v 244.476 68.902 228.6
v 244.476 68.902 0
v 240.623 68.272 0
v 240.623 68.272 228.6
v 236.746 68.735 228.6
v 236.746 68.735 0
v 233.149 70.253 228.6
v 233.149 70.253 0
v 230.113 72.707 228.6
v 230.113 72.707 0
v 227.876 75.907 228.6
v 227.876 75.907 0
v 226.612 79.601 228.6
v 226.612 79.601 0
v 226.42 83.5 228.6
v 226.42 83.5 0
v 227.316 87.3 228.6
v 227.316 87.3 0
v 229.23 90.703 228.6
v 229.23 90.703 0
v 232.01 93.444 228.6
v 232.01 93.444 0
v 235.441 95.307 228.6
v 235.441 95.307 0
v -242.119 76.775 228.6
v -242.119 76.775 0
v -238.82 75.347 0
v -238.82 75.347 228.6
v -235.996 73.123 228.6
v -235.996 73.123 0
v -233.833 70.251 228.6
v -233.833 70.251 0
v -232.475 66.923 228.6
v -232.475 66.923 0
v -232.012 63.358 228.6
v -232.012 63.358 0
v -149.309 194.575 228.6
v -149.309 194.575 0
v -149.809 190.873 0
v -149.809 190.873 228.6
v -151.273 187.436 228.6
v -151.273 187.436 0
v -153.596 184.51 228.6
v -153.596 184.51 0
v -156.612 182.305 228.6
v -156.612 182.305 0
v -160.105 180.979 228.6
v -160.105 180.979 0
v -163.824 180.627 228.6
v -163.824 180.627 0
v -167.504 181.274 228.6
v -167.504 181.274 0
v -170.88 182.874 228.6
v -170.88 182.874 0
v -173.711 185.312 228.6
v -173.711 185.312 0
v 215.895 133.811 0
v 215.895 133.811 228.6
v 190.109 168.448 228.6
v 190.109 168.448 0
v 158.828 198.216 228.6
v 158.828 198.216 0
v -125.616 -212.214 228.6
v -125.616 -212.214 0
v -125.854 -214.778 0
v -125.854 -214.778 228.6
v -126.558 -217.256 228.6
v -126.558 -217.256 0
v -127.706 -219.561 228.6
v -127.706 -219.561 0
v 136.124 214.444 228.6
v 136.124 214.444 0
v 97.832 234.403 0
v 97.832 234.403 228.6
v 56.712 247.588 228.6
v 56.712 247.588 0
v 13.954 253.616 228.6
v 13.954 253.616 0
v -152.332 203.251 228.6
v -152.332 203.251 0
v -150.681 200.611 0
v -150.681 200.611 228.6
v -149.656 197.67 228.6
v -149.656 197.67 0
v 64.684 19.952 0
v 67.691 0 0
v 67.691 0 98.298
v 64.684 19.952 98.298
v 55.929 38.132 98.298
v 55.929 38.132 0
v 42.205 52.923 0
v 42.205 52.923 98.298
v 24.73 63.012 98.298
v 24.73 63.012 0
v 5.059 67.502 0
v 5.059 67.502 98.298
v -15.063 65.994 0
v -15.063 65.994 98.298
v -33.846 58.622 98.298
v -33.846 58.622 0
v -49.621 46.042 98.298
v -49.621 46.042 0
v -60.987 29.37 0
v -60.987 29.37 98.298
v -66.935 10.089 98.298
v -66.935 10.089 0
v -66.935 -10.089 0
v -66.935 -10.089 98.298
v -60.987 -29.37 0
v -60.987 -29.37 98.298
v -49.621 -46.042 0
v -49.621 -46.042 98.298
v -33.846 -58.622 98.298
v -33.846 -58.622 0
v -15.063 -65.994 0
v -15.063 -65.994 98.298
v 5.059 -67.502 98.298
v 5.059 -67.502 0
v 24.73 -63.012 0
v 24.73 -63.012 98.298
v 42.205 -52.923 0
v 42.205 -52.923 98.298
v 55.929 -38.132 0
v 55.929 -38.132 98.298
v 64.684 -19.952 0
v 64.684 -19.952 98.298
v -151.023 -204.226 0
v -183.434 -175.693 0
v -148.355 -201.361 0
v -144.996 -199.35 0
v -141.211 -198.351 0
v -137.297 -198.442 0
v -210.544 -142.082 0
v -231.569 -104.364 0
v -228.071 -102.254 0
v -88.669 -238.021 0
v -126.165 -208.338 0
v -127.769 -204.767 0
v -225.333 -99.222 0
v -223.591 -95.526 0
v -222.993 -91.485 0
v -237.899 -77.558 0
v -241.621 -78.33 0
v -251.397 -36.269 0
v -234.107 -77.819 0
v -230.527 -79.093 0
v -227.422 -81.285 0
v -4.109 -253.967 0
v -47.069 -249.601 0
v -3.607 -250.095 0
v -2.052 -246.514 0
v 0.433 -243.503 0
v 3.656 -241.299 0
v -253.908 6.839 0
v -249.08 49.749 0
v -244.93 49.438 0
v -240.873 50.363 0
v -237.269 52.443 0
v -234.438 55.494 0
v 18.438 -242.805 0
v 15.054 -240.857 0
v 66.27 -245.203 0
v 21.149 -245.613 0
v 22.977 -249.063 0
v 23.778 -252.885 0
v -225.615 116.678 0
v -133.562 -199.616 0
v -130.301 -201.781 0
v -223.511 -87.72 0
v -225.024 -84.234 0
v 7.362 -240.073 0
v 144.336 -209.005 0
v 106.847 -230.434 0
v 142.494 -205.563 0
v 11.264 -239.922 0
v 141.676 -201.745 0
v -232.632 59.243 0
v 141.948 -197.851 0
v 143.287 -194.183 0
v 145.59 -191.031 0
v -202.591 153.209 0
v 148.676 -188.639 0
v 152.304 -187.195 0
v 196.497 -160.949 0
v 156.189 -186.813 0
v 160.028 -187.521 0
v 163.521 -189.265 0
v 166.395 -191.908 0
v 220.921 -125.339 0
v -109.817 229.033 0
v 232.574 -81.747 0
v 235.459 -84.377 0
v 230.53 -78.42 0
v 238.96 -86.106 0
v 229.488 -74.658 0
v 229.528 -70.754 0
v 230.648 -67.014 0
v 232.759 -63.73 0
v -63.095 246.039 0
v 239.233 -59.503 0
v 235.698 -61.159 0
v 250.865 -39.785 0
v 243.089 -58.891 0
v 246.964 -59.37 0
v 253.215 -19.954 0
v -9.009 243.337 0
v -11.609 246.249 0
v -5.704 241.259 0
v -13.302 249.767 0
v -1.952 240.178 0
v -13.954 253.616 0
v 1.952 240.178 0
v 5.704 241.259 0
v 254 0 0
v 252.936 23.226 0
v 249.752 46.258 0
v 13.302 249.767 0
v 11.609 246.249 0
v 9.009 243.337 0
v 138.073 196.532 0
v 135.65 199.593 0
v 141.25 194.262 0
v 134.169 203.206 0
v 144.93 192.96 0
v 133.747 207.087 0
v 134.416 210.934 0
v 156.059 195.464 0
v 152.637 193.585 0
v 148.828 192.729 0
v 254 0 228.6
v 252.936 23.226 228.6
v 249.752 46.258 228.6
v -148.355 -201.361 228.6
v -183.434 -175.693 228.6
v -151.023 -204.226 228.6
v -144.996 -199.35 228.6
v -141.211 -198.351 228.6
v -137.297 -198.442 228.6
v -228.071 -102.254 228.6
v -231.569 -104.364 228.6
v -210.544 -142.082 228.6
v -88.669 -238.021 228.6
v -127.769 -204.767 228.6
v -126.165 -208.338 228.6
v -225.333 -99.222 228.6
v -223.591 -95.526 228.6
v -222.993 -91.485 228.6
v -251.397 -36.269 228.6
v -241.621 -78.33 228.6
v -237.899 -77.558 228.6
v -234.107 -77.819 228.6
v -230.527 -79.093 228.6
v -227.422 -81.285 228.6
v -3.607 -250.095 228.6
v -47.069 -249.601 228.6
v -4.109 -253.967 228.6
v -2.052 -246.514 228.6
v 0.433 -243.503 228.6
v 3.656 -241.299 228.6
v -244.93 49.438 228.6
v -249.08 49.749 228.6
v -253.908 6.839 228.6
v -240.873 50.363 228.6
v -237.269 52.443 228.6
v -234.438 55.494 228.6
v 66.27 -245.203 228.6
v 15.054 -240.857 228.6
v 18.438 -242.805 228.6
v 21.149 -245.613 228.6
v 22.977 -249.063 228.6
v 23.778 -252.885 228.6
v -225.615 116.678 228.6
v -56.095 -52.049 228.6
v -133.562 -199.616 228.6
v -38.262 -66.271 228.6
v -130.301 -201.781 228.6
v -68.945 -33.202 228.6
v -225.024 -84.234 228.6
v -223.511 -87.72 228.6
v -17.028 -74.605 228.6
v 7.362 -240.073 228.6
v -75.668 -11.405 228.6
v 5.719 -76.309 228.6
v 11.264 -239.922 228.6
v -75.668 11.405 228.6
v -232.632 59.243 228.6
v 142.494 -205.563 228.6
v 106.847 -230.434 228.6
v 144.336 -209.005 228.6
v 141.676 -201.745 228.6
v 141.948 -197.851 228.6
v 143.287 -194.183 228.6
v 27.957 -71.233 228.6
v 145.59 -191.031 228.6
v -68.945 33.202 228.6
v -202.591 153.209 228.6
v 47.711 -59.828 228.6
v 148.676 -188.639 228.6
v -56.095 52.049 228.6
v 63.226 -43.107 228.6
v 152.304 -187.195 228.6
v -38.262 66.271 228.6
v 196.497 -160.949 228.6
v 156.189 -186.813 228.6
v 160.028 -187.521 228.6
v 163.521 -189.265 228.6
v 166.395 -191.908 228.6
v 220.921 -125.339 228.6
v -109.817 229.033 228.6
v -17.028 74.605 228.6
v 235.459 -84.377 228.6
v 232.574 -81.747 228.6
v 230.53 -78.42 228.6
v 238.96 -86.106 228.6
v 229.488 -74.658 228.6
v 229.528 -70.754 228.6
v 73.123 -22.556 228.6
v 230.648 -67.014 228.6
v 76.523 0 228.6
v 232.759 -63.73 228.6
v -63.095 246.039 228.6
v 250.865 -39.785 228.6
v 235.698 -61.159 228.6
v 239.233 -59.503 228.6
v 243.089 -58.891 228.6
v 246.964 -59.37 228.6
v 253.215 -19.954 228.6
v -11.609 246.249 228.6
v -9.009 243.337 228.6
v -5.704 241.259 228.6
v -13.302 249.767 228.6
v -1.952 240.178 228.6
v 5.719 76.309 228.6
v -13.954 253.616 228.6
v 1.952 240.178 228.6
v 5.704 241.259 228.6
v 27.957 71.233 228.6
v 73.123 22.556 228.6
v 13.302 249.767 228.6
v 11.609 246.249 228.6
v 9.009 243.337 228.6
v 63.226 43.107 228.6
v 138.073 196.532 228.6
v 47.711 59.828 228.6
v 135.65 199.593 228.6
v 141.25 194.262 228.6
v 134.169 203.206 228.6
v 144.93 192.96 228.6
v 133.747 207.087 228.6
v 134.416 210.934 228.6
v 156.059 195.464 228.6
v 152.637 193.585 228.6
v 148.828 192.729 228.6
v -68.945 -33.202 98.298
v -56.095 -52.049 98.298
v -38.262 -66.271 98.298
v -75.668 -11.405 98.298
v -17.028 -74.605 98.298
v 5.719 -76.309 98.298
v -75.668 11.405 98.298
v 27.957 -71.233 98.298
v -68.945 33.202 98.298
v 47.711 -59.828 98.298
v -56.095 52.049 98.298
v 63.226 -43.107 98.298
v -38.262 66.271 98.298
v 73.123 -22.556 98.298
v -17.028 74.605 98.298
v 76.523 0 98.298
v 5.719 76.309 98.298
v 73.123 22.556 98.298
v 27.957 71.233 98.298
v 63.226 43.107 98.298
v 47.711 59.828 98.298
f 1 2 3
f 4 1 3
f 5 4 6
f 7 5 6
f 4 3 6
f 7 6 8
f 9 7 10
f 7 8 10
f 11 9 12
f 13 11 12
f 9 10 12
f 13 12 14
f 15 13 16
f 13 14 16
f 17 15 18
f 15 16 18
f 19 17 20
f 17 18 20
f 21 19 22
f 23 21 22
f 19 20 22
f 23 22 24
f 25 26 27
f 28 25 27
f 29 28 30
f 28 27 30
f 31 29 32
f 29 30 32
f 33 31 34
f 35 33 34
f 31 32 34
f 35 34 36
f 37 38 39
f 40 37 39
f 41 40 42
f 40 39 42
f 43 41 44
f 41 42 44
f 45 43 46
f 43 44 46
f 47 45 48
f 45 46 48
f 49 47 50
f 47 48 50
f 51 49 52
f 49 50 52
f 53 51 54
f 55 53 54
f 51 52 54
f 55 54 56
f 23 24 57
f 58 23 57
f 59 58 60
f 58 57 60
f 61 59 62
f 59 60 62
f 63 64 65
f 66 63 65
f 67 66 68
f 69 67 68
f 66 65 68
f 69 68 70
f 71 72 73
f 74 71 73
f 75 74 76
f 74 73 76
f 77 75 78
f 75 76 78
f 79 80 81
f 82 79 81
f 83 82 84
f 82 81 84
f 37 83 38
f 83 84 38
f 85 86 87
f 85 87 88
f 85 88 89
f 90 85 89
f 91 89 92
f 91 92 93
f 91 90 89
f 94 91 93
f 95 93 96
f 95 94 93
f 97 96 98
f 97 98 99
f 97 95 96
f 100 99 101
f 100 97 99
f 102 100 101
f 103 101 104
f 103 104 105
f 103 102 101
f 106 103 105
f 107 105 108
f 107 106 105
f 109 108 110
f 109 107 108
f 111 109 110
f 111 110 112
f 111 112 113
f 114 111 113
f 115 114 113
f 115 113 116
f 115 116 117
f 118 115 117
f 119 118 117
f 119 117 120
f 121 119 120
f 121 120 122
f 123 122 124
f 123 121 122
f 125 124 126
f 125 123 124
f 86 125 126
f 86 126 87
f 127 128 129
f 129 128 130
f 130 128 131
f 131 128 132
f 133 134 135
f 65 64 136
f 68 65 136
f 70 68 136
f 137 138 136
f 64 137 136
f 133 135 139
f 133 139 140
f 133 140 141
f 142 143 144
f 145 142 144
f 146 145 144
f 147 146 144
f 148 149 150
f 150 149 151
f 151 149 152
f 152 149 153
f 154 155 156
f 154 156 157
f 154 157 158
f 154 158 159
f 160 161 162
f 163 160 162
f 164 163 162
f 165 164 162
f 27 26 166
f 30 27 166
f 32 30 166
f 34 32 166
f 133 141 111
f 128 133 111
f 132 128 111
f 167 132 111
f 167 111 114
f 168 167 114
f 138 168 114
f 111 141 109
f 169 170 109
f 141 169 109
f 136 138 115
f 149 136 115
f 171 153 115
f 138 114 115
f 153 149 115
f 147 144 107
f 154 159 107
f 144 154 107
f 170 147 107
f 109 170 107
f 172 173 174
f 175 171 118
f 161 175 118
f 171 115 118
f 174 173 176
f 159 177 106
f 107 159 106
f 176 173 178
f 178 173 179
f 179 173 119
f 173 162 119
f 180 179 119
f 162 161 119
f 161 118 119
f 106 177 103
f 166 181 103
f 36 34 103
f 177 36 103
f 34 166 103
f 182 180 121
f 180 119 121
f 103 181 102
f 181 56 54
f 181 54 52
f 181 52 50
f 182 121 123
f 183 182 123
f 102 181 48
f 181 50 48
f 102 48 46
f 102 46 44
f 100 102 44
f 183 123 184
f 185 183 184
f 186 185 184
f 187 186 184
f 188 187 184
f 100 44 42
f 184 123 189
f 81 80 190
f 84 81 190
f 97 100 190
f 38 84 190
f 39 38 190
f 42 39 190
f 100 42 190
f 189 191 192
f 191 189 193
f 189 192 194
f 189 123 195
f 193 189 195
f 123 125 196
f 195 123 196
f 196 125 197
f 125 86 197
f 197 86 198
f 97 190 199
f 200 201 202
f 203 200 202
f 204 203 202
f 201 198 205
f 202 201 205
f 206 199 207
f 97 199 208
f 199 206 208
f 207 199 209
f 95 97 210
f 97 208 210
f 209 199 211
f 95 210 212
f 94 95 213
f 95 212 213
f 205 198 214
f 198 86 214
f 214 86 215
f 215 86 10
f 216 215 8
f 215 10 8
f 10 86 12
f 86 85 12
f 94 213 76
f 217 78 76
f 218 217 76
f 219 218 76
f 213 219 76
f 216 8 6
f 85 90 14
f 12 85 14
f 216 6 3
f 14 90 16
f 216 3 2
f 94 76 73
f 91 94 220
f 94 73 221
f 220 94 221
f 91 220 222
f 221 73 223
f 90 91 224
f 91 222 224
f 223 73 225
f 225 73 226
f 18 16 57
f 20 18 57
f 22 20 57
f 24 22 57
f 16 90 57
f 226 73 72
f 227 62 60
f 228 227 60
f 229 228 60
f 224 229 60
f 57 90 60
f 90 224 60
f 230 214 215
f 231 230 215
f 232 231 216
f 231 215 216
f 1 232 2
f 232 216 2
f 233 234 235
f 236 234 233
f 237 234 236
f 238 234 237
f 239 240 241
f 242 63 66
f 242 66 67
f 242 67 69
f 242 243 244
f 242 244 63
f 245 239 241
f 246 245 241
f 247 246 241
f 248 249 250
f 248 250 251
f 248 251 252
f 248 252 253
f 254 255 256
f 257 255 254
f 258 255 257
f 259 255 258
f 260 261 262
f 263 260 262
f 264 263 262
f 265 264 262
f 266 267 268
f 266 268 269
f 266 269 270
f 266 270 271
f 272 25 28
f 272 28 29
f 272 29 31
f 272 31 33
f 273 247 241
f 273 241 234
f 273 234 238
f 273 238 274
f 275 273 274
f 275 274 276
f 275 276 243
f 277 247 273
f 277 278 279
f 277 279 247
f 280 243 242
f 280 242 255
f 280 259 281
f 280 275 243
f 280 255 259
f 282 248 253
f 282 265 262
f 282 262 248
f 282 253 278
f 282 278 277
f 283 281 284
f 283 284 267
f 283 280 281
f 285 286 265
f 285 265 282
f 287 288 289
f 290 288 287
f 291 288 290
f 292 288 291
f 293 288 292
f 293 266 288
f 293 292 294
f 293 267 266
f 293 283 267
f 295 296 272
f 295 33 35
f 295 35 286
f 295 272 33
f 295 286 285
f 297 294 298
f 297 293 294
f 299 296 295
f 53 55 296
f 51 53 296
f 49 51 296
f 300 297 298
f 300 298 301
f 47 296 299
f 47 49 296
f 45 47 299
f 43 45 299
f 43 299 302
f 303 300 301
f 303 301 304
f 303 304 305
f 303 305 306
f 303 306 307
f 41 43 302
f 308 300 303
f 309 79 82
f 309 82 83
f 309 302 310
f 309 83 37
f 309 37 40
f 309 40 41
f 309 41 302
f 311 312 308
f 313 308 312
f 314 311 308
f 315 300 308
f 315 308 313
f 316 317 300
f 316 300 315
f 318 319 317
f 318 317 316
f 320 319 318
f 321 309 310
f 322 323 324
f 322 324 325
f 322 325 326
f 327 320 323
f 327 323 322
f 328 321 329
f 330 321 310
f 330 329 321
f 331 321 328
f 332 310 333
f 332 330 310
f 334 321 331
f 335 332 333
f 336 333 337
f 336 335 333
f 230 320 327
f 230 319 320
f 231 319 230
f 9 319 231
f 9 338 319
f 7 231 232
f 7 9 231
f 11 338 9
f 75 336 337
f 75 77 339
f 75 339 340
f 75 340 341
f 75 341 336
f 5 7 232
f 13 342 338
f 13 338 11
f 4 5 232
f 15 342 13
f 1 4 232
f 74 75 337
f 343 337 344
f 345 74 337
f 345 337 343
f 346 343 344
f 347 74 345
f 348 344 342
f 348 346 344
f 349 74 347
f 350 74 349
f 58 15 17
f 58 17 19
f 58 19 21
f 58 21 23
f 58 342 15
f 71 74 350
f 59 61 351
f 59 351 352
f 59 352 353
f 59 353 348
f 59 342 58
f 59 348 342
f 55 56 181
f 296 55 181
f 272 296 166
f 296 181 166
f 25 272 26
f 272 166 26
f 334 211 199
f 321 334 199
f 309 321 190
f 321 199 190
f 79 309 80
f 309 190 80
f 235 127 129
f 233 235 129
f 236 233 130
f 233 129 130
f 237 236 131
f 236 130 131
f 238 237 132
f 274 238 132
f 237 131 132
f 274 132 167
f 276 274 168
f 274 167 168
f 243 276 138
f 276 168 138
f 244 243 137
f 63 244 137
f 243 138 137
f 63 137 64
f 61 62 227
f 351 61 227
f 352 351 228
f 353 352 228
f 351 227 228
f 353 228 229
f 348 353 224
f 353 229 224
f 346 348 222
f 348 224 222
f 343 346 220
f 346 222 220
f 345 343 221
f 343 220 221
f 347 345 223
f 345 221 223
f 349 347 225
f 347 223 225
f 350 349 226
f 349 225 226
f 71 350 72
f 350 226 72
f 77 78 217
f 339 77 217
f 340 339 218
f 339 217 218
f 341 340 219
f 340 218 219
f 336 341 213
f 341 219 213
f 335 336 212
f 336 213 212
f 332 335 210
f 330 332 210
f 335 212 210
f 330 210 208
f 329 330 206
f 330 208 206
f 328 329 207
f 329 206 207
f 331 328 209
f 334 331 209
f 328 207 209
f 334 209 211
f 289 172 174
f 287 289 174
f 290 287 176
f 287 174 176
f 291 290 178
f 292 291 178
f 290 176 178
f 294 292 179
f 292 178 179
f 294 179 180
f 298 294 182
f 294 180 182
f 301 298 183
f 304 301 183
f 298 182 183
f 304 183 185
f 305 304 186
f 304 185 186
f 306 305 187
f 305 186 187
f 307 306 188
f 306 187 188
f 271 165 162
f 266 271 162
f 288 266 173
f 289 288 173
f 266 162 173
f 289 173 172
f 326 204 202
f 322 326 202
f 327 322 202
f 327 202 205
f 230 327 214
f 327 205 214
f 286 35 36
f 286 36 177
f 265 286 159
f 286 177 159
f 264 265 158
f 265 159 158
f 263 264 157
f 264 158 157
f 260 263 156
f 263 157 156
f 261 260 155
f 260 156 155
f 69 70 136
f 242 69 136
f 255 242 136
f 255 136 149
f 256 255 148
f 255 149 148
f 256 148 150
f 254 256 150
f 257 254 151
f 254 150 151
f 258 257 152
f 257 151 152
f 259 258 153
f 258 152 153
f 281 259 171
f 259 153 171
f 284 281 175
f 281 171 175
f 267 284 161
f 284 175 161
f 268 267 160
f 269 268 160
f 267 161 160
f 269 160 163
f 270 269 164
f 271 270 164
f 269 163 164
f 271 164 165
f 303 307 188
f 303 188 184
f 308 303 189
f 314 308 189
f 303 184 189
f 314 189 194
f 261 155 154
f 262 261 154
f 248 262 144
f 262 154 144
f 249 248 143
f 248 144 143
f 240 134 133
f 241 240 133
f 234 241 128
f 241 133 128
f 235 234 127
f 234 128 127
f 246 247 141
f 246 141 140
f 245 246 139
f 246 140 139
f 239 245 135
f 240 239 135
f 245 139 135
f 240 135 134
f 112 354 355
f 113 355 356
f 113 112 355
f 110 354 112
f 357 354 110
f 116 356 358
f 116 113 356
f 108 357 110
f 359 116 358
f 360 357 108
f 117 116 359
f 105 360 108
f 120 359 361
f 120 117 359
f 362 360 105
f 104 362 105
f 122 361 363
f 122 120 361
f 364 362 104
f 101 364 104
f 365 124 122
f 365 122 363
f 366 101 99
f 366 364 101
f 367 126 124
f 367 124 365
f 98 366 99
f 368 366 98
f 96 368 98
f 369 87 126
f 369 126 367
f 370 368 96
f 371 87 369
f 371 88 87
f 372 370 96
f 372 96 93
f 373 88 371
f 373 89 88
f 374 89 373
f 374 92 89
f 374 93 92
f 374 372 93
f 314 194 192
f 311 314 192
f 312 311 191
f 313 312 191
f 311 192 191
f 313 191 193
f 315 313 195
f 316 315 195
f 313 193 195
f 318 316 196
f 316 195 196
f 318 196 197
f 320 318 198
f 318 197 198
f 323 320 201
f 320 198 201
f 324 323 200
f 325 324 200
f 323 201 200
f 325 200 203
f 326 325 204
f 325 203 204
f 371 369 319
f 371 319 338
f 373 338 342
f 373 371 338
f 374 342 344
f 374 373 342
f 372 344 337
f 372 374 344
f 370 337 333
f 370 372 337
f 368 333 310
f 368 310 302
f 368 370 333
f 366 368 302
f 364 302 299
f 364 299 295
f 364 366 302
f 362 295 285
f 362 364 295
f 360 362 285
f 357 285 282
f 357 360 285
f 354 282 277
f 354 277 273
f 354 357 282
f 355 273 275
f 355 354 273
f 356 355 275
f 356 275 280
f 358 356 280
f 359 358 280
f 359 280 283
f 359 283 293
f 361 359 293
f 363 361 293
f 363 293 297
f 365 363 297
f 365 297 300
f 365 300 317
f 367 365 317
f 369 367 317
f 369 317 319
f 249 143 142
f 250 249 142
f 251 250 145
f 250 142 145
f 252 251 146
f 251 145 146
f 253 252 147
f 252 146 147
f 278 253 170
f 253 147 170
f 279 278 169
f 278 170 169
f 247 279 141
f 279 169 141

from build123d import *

# Parameters (mm, degrees)
F0_R     = 67.691
F1_DEPTH = 98.298
F2_R     = 76.523192
F3_DEPTH = 228.6


with BuildPart() as f1:
    # F0 (on Top) → F1 (new body)
    with BuildSketch(Plane.XY):
        Polygon((20.642572, -144.15397), (135.162286, -54.199993), (114.519714, 89.953977), (-20.642572, 144.15397), (-135.162286, 54.199993), (-114.519714, -89.953977), align=None)
        Circle(F0_R, mode=Mode.SUBTRACT)
    extrude(amount=F1_DEPTH)

    # F2 (on Top) → F3 (join)
    with BuildSketch(Plane.XY):
        with BuildLine():
            ThreePointArc((246.963915, -59.370235), (252.234845, -29.892856), (254, 0))
            ThreePointArc((254, 0), (251.607755, 34.778404), (244.476083, 68.901703))
            ThreePointArc((244.476083, 68.901703), (227.114105, 77.709336), (235.441325, 95.306781))
            ThreePointArc((235.441325, 95.306781), (203.739291, 151.678282), (158.82823, 198.216027))
            ThreePointArc((158.82823, 198.216027), (139.581788, 195.285642), (136.12364, 214.444293))
            ThreePointArc((136.12364, 214.444293), (77.552803, 241.870963), (13.953987, 253.616416))
            ThreePointArc((13.953987, 253.616416), (0, 240.040742), (-13.953987, 253.616416))
            ThreePointArc((-13.953987, 253.616416), (-86.873116, 238.681926), (-152.332115, 203.250896))
            ThreePointArc((-152.332115, 203.250896), (-150.086276, 199.168943), (-149.308795, 194.575289))
            ThreePointArc((-149.308795, 194.575289), (-158.313913, 181.524718), (-173.710864, 185.311996))
            ThreePointArc((-173.710864, 185.311996), (-214.880552, 135.433926), (-242.118892, 76.77527))
            ThreePointArc((-242.118892, 76.77527), (-234.821293, 71.757087), (-232.011792, 63.358051))
            ThreePointArc((-232.011792, 63.358051), (-237.268803, 52.4433), (-249.080289, 49.749468))
            ThreePointArc((-249.080289, 49.749468), (-253.570272, -14.768787), (-241.620537, -78.329536))
            ThreePointArc((-241.620537, -78.329536), (-228.899573, -80.082867), (-222.993203, -91.485142))
            ThreePointArc((-222.993203, -91.485142), (-225.333207, -99.221668), (-231.568706, -104.364431))
            ThreePointArc((-231.568706, -104.364431), (-197.704688, -159.46428), (-151.022883, -204.225583))
            ThreePointArc((-151.022883, -204.225583), (-135.388346, -198.897355), (-125.616022, -212.213904))
            ThreePointArc((-125.616022, -212.213904), (-126.148708, -216.033334), (-127.706111, -219.561265))
            ThreePointArc((-127.706111, -219.561265), (-68.115844, -244.696203), (-4.109422, -253.966755))
            ThreePointArc((-4.109422, -253.966755), (9.307669, -239.86022), (23.777564, -252.884613))
            ThreePointArc((23.777564, -252.884613), (86.873116, -238.681926), (144.336425, -209.004776))
            ThreePointArc((144.336425, -209.004776), (147.049089, -189.726443), (166.394684, -191.908336))
            ThreePointArc((166.394684, -191.908336), (209.467451, -143.664146), (238.959818, -86.105781))
            ThreePointArc((238.959818, -86.105781), (229.956513, -68.844461), (246.963915, -59.370235))
        make_face()
        Circle(F2_R, mode=Mode.SUBTRACT)
    extrude(amount=F3_DEPTH)


solid = f1.part
